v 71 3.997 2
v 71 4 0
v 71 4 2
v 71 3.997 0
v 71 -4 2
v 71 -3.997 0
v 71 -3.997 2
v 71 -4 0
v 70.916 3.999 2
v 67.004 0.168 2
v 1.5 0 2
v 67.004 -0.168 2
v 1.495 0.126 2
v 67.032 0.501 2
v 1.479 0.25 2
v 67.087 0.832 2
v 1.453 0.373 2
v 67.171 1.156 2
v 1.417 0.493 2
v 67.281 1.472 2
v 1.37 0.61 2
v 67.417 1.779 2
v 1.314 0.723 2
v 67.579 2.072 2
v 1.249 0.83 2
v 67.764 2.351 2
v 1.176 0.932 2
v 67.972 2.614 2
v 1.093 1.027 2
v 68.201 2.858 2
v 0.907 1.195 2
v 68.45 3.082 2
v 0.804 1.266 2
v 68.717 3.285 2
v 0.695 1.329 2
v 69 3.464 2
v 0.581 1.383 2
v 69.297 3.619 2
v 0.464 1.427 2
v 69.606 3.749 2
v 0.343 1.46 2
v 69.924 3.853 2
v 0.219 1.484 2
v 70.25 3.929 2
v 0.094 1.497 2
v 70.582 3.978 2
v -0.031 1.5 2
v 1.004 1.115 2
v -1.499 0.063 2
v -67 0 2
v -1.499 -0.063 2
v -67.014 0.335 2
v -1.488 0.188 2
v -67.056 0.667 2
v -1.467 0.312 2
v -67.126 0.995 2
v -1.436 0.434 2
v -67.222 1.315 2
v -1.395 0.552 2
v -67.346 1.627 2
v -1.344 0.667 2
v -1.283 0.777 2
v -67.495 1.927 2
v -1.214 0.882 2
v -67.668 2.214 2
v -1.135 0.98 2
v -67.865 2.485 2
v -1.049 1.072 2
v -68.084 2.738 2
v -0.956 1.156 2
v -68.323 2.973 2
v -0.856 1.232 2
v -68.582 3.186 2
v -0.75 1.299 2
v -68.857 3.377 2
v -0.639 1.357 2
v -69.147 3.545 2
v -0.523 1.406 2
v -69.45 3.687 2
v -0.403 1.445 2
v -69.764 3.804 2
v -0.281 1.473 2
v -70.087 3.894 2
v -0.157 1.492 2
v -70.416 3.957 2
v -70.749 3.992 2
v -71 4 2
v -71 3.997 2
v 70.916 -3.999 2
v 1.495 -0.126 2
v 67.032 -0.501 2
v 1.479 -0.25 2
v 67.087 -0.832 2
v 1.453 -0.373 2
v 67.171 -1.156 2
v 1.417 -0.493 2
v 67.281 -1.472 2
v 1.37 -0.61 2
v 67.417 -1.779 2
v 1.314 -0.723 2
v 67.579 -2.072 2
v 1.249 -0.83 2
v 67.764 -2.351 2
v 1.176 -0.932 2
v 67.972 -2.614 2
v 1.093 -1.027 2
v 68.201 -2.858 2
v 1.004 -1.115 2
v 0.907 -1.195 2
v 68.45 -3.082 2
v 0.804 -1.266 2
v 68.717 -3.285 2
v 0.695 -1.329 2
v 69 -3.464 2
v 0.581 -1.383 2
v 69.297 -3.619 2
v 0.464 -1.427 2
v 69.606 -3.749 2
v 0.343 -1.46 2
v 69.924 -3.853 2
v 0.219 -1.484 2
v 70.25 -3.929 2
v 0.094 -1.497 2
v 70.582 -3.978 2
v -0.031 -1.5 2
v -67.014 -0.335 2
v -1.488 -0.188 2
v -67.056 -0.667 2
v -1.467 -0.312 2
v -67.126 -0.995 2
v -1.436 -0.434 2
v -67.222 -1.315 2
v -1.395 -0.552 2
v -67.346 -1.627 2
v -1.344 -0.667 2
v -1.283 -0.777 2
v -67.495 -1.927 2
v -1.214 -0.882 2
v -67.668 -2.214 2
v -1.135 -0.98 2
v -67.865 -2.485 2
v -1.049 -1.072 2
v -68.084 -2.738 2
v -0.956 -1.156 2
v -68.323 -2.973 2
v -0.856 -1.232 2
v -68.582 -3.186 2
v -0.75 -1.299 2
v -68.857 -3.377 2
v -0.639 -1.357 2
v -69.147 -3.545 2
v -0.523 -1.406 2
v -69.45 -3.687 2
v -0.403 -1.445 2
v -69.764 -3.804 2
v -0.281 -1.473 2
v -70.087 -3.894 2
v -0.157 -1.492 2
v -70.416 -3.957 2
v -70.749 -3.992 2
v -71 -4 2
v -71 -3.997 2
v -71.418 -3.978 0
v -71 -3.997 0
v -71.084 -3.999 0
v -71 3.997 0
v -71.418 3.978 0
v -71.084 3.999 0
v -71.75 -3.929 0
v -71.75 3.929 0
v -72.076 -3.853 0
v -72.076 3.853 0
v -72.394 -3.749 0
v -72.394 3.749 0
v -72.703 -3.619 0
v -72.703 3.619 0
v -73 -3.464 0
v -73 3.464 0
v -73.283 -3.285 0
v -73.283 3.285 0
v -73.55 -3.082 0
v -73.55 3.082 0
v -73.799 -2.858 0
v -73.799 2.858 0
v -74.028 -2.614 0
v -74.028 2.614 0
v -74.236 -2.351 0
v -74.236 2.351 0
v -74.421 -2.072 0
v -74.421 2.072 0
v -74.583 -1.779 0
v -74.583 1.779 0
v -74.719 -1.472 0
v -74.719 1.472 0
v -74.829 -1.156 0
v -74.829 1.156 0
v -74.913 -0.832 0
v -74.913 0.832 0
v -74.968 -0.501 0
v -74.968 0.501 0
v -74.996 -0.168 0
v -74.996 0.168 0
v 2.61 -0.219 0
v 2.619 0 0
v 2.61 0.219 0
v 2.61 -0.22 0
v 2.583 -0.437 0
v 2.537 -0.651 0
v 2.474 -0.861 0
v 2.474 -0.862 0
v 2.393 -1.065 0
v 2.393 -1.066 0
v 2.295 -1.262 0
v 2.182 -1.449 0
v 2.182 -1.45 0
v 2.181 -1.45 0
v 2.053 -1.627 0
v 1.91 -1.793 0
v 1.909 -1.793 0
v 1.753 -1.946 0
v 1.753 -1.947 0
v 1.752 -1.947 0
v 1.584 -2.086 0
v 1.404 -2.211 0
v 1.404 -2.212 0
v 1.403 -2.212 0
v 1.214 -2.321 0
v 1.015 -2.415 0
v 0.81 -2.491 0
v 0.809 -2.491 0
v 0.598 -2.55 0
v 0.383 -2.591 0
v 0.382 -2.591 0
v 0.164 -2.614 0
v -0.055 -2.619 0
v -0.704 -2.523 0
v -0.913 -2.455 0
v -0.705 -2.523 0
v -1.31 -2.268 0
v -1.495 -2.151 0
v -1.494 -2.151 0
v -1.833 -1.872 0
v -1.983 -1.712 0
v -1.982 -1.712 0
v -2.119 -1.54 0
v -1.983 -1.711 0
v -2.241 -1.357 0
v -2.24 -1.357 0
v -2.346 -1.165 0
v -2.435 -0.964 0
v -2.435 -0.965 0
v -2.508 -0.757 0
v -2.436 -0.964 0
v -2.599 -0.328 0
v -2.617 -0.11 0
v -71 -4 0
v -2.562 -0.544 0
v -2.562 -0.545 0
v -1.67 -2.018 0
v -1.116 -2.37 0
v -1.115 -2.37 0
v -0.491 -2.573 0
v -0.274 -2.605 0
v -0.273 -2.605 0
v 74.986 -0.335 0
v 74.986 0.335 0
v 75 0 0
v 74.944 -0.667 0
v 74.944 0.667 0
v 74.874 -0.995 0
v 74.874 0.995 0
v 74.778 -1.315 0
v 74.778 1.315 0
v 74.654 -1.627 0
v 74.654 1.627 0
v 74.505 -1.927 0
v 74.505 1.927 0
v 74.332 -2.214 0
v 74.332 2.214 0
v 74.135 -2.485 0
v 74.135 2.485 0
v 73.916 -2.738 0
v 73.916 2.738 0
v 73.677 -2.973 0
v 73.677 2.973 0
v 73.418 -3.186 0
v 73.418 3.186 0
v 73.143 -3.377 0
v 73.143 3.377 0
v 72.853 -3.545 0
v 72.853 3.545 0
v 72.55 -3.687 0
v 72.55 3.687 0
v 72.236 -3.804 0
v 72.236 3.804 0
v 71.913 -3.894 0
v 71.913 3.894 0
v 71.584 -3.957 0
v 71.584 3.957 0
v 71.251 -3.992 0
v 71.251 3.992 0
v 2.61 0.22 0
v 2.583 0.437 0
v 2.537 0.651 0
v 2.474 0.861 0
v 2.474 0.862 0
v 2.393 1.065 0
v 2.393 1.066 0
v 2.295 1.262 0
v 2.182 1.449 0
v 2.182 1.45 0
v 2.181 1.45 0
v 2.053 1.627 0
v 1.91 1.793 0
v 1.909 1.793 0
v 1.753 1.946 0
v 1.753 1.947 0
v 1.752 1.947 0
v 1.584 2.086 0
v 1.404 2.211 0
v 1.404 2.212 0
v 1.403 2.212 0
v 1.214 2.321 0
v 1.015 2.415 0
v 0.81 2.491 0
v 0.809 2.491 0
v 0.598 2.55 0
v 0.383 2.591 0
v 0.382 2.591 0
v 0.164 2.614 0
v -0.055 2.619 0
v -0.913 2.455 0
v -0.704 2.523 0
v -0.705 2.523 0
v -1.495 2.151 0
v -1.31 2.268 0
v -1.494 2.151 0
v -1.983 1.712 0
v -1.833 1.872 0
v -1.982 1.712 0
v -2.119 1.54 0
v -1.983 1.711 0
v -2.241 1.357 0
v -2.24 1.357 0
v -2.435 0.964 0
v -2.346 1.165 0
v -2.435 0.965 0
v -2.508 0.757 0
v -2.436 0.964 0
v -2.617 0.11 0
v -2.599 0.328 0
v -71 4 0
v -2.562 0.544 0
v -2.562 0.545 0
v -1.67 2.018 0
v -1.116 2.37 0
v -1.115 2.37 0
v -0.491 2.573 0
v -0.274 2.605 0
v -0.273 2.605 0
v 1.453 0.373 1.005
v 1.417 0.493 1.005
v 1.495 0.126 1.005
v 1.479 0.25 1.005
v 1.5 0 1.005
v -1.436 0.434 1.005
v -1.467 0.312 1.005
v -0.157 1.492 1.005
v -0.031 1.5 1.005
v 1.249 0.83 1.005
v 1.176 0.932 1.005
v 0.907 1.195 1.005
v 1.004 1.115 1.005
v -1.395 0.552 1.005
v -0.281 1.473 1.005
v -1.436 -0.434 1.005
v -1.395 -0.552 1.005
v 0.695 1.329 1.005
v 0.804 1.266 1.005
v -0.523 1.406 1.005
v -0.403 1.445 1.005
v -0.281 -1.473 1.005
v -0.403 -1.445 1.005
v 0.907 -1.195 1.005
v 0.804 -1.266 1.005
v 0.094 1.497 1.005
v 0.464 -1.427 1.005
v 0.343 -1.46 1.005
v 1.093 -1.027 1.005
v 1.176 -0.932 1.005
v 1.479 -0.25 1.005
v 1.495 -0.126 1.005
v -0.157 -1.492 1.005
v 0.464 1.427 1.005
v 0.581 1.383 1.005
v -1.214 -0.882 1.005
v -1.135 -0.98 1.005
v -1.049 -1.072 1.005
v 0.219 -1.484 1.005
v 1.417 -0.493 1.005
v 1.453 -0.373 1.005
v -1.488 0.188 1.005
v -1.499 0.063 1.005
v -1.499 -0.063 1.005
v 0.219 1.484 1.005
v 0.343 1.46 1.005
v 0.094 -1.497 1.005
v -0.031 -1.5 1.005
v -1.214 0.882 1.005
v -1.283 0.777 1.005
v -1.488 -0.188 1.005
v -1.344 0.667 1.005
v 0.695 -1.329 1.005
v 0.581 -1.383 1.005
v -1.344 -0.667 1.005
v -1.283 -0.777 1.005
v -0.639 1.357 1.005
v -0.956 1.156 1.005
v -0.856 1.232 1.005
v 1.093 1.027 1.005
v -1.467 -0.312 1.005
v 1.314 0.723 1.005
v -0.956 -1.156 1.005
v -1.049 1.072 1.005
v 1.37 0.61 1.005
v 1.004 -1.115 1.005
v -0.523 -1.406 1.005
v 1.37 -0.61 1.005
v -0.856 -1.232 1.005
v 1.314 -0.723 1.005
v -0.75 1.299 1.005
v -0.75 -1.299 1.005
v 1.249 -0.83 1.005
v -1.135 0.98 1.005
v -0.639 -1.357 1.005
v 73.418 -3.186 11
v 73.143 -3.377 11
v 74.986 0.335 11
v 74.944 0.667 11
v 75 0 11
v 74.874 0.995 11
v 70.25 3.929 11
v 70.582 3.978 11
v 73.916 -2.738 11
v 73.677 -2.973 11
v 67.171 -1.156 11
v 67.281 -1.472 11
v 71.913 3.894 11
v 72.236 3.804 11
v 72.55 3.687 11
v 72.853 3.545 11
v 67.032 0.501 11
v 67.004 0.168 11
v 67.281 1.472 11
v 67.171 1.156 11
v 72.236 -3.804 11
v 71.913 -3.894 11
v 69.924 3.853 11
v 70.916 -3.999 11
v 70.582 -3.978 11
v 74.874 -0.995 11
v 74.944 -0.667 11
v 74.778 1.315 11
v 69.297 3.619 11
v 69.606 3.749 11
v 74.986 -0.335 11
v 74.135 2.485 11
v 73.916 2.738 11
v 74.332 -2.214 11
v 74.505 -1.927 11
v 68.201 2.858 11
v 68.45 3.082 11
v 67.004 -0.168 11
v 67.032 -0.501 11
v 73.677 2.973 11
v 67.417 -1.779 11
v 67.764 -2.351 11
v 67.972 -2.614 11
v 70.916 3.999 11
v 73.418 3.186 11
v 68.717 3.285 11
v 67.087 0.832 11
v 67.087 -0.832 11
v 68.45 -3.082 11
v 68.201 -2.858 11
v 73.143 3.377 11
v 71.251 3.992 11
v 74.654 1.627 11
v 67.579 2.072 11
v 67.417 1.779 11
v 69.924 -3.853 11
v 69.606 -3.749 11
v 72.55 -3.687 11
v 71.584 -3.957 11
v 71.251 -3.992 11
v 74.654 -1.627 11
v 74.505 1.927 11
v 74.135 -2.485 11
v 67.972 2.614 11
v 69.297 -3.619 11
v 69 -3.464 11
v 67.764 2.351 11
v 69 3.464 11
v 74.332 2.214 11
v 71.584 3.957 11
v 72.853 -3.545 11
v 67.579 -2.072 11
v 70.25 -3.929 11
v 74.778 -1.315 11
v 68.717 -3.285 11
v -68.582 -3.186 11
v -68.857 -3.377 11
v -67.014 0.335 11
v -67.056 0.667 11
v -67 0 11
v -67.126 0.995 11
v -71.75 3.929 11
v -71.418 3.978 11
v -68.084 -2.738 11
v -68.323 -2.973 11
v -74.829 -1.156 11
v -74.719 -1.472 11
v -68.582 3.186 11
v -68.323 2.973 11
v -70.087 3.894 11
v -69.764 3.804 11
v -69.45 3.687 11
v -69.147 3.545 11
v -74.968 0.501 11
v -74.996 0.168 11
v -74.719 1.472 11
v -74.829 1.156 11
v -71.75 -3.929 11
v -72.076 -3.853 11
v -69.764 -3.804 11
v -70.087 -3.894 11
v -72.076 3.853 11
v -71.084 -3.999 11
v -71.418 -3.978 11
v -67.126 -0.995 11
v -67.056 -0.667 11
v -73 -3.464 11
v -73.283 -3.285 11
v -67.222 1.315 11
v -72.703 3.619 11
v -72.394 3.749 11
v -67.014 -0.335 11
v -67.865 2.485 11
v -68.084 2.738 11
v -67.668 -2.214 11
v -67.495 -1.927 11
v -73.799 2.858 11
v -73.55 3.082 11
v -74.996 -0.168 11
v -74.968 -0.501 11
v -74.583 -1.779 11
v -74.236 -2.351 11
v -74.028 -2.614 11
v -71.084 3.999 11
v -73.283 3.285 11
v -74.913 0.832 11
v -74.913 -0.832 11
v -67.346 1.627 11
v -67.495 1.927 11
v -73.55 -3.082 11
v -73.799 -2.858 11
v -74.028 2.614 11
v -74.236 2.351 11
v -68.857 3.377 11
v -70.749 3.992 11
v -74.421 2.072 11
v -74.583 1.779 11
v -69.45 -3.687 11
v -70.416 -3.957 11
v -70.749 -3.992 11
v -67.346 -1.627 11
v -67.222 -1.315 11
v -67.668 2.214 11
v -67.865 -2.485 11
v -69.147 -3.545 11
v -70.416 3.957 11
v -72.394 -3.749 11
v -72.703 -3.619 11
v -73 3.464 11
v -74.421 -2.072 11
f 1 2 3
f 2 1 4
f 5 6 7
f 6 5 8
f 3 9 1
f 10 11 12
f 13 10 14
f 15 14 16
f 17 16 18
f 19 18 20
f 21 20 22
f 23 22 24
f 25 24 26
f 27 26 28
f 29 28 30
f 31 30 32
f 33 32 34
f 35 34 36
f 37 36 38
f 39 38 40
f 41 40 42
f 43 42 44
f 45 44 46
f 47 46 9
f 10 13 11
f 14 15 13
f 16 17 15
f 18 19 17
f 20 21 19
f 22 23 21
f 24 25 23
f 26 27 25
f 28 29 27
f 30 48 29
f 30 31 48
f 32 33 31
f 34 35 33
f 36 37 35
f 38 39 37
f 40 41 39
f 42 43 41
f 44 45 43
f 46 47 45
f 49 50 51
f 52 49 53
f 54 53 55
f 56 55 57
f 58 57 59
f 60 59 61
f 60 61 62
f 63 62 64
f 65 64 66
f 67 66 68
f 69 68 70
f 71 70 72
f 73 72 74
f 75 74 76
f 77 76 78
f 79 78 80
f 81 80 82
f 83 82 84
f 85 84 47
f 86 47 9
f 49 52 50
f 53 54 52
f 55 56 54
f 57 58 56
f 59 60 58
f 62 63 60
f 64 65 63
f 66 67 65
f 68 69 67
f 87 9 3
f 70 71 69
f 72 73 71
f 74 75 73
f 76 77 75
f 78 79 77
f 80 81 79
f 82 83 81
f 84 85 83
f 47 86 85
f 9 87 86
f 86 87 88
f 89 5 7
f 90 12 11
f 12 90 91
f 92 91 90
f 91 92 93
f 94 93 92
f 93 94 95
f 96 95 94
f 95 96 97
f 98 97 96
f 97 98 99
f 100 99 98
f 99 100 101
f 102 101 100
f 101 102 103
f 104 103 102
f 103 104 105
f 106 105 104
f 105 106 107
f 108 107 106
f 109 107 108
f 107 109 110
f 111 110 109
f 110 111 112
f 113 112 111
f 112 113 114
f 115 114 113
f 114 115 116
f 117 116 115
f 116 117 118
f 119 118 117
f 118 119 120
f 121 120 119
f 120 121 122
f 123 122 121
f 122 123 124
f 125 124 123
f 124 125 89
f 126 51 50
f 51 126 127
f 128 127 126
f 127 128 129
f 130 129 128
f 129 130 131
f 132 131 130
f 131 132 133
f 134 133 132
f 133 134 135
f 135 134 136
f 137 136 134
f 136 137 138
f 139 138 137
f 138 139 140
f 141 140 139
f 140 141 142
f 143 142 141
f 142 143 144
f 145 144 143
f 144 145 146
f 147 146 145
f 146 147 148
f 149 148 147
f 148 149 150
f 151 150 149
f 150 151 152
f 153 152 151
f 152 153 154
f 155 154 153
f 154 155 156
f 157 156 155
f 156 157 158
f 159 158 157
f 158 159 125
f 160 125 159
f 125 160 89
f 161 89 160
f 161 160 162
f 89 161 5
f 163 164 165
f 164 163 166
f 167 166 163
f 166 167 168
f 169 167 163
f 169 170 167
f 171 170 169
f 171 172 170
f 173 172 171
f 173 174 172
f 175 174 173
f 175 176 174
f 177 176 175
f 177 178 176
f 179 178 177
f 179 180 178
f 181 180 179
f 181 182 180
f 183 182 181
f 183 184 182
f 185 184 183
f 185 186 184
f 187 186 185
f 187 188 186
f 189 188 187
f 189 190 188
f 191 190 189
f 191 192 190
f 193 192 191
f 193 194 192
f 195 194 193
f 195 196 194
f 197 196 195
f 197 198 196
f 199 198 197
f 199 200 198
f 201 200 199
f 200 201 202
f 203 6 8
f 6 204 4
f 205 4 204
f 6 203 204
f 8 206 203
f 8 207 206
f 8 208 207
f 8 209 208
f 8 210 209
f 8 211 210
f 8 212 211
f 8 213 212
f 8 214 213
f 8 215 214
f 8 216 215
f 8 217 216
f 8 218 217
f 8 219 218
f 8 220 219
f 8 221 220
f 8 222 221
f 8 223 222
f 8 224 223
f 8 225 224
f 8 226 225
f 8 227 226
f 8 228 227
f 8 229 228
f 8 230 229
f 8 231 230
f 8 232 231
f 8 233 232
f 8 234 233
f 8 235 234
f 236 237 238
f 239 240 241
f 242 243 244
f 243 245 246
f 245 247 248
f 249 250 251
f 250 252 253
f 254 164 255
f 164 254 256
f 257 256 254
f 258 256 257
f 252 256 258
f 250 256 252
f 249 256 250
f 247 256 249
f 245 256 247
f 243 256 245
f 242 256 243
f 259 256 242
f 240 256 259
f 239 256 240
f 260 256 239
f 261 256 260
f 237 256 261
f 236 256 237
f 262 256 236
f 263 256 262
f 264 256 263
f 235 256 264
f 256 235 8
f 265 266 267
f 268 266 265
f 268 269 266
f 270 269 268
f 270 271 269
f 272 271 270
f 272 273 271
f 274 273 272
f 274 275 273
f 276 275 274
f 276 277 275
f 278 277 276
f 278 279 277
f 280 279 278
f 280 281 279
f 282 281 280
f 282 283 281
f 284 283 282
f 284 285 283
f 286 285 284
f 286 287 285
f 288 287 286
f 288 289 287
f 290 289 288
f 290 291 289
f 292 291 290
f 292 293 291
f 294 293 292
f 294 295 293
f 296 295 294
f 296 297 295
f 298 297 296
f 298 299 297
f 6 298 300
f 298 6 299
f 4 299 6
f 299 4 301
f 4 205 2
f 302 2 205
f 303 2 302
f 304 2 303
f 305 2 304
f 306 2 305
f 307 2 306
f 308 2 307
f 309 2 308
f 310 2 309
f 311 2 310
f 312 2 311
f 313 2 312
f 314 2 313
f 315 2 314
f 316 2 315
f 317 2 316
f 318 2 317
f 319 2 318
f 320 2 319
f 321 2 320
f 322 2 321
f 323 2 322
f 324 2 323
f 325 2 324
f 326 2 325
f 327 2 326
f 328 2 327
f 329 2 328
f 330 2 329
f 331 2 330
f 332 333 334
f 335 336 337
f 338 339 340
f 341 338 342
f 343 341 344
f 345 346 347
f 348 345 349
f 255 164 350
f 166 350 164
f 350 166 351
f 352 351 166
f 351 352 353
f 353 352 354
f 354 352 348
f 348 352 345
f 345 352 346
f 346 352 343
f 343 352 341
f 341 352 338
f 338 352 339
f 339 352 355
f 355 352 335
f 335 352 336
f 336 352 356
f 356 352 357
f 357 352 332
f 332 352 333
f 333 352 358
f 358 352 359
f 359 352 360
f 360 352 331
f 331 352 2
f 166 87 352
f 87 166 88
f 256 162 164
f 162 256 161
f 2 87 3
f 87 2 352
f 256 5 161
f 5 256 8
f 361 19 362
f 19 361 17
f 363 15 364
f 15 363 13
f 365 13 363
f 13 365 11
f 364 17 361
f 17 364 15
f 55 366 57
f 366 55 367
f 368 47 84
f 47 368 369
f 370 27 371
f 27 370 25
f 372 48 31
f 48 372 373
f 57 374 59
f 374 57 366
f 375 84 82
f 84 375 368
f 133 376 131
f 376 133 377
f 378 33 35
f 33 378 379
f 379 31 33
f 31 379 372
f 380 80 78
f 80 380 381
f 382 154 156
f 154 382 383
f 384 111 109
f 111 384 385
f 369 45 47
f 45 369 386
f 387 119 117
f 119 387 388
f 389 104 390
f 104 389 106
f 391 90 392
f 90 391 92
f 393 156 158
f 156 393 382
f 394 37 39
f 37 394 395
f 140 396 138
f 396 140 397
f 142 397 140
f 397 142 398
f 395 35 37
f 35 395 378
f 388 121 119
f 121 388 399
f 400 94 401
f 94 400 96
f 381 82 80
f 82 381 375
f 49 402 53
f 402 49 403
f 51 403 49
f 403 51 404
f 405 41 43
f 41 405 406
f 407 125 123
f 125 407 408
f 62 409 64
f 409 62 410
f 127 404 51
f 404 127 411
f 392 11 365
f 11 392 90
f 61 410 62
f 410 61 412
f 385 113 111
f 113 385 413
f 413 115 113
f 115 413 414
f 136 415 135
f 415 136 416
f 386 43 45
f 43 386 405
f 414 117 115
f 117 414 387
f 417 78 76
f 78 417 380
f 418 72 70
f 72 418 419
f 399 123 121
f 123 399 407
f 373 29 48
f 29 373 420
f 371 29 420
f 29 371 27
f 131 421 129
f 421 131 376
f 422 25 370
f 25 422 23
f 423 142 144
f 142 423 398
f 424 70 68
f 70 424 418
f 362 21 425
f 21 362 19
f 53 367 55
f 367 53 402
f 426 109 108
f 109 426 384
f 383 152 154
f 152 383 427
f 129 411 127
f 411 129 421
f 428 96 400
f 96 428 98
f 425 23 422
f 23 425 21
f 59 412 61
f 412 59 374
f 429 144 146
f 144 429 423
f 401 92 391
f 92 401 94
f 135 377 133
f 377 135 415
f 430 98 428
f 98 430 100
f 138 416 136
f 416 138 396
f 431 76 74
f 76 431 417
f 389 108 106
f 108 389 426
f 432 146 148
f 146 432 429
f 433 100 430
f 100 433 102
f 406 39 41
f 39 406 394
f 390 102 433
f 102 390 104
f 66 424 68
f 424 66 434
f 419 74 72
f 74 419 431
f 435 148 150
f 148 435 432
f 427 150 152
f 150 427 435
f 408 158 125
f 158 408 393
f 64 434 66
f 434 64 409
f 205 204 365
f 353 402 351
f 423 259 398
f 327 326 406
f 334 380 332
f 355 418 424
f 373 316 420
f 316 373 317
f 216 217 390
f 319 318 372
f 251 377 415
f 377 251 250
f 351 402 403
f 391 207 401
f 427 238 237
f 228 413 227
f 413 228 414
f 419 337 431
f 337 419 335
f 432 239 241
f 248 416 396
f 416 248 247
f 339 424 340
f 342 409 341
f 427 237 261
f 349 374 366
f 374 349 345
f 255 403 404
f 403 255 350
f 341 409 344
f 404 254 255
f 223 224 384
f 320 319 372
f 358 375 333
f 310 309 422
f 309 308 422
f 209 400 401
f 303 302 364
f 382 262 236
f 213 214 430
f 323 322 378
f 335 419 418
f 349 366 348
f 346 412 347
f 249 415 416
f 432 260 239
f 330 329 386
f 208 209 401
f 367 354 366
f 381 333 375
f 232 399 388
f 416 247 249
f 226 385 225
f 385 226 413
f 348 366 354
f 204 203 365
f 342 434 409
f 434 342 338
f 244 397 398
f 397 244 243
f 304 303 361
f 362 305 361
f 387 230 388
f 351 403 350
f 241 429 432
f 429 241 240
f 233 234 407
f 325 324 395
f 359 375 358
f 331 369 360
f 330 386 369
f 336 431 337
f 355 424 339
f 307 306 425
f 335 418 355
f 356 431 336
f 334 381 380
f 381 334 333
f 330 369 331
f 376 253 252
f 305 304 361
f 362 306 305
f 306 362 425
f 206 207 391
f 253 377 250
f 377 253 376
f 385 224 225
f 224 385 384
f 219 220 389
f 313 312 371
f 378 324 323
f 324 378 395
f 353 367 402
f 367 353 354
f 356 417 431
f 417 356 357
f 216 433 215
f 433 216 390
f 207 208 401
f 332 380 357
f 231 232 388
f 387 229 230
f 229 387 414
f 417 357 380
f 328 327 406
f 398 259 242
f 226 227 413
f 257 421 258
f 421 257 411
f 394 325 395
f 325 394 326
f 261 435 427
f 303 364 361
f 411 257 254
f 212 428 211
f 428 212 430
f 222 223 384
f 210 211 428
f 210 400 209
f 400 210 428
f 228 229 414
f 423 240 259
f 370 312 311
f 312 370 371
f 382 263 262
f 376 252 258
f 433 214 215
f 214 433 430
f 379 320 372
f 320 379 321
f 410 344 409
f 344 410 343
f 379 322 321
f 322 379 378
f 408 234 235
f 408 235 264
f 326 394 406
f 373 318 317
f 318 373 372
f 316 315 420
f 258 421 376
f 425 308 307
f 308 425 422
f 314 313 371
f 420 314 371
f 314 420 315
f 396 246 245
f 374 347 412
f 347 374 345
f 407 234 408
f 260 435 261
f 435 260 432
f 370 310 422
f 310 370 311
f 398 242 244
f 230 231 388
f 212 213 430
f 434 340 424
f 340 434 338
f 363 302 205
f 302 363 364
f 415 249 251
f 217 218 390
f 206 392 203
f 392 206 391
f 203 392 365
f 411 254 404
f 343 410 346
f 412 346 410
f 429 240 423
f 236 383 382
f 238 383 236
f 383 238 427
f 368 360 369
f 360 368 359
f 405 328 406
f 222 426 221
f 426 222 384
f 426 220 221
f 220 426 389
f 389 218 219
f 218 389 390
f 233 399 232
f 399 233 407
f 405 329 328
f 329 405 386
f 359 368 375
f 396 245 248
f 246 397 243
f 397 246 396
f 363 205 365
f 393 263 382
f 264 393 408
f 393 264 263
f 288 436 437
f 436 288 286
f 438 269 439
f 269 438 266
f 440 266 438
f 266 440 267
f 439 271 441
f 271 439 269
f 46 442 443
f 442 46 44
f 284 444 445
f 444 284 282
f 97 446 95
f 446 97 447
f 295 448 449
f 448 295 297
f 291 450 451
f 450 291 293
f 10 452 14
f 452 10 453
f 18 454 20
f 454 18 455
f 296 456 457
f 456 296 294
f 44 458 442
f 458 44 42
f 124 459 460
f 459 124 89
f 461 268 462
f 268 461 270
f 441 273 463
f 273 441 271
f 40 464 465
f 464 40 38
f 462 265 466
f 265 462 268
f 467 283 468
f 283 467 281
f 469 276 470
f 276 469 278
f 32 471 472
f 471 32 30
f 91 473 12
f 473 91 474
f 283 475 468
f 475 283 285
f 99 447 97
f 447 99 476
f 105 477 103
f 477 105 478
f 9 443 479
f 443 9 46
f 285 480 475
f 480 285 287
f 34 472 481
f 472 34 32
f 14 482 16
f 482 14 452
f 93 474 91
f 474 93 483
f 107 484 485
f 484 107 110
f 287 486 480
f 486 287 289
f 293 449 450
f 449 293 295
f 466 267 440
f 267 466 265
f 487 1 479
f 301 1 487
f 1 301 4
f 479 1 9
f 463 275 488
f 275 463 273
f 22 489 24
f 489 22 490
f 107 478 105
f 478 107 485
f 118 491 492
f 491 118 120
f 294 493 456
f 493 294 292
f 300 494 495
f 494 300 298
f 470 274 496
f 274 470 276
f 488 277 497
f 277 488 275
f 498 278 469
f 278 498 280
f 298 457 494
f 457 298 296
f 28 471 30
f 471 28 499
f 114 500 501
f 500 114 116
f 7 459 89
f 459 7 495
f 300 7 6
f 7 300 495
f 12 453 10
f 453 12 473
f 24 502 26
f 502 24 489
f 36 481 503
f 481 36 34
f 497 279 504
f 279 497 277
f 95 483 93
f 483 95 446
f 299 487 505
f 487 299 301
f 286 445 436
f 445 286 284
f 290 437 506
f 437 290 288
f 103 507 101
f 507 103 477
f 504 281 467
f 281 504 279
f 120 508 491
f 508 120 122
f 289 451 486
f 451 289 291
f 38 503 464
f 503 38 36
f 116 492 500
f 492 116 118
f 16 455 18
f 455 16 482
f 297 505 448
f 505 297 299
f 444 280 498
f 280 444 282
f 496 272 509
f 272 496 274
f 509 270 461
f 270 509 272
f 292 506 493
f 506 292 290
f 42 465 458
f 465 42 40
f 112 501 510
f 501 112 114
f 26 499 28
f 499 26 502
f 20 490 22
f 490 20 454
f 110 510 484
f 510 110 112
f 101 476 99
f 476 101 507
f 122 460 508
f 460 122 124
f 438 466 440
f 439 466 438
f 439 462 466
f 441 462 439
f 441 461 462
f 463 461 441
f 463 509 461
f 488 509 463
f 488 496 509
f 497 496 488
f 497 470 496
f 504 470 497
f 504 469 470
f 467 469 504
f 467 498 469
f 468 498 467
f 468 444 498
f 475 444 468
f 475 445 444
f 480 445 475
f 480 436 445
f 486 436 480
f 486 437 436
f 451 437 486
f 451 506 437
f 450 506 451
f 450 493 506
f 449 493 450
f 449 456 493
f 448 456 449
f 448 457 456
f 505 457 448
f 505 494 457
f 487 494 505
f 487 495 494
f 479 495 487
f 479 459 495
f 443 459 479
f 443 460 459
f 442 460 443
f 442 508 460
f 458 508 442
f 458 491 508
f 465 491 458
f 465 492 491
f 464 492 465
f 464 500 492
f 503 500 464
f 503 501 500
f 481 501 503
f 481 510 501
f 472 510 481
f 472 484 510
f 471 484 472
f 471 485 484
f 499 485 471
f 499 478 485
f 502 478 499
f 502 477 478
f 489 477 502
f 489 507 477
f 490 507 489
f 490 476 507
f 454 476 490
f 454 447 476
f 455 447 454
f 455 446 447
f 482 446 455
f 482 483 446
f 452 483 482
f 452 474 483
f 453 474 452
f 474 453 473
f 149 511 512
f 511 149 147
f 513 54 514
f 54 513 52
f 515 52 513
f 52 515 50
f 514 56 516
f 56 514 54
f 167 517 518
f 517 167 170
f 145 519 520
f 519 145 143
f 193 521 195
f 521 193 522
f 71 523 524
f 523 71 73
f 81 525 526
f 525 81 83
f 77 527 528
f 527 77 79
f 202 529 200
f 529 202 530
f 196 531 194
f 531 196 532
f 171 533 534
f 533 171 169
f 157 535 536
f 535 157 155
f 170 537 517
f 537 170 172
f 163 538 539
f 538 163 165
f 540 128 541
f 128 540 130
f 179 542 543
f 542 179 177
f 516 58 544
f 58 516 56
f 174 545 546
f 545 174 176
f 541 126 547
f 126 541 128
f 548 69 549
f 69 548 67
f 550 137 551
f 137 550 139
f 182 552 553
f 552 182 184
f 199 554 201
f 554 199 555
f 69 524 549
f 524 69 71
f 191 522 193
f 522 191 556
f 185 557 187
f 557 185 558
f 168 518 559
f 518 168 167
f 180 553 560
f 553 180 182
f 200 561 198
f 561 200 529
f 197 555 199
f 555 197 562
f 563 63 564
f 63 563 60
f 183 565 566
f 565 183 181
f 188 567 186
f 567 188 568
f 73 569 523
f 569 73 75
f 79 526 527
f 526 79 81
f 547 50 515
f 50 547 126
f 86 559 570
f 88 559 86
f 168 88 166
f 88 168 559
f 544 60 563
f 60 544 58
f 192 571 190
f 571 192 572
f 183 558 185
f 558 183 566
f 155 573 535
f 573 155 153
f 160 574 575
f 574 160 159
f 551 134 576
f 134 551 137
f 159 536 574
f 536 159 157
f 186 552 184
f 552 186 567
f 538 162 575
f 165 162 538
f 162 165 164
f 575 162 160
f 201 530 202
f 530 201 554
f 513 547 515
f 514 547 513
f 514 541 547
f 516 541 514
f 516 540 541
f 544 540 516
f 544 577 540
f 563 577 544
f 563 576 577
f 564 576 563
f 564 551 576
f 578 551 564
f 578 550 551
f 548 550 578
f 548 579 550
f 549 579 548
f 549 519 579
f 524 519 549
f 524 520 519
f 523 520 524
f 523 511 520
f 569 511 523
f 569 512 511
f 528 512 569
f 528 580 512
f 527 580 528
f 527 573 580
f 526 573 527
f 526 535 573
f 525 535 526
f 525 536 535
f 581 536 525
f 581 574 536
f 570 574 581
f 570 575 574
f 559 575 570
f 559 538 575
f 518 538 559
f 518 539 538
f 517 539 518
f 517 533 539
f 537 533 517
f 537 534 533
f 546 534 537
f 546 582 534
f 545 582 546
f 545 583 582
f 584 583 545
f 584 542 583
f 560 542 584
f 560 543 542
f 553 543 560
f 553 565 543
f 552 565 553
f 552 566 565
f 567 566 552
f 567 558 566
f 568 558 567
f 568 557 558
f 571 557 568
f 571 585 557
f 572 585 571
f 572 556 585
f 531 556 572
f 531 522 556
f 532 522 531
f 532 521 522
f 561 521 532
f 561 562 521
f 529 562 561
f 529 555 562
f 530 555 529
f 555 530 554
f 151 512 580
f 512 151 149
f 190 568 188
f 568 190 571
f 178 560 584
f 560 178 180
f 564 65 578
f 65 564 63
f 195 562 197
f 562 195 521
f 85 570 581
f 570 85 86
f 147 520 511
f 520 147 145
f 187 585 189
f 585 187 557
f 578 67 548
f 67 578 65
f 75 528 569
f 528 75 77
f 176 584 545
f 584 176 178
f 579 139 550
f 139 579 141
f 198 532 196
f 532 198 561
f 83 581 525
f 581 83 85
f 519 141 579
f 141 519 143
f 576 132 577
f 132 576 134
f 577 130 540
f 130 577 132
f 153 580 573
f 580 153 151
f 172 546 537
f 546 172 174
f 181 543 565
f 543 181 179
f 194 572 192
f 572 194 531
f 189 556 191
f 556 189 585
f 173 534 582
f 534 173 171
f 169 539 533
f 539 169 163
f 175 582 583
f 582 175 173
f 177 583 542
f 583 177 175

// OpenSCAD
/* [Hidden] */
$fn=75;
minimumBarW = 3;
minimumBarH = 2;
minimumBarL = 9;
minimumHoleD = 1;

/* [Configure] */
// Cylinders Diameter
cylinderDiameter = 8; // [3:20]
// Cylinders Height
cylinderHeight = 9; // [3:20]
// Hole Diameter
holeDiameter = 3; // [1:7]
// Tool Length
toolLength = 150; // [40:10:500]

minimumCylinderW = holeDiameter * 2 > minimumBarW ? holeDiameter * 2 : minimumBarW;
minimumCylinderH = minimumCylinderW/2;

barHeight = toolLength / 100;
cylinderD = cylinderDiameter < minimumCylinderW ? minimumCylinderW : cylinderDiameter;
barL = toolLength < minimumBarL ? minimumBarL : toolLength - cylinderD;
barH = barHeight < minimumBarH ? minimumBarH : barHeight;
cylinderH = cylinderHeight < minimumCylinderH ? minimumCylinderH + barH : cylinderHeight + barH;
barW = cylinderD;
holeD = holeDiameter < minimumHoleD ? minimumHoleD : holeDiameter;

translate([0,0,barH/2])
	difference()
	{
		cube([barL,barW,barH],center=true);
		cylinder(d=holeDiameter,h=barH+.01,center=true);
		translate([0,0,-barH/4])
			cylinder(d1=holeDiameter*1.75,d2=holeDiameter,h=barH/2+.01,center=true);
	}
translate([barL/2,0,cylinderH/2])
	cylinder(d=cylinderD,h=cylinderH,center=true);
translate([-barL/2,0,cylinderH/2])
	cylinder(d=cylinderD,h=cylinderH,center=true);

echo(str("Bar Dimensions (L,W,H):  (",barL,",",barW,",",barH,")"));
echo(str("Cylinder Dimensions (D,H):  (",cylinderD,",",cylinderH,")"));
